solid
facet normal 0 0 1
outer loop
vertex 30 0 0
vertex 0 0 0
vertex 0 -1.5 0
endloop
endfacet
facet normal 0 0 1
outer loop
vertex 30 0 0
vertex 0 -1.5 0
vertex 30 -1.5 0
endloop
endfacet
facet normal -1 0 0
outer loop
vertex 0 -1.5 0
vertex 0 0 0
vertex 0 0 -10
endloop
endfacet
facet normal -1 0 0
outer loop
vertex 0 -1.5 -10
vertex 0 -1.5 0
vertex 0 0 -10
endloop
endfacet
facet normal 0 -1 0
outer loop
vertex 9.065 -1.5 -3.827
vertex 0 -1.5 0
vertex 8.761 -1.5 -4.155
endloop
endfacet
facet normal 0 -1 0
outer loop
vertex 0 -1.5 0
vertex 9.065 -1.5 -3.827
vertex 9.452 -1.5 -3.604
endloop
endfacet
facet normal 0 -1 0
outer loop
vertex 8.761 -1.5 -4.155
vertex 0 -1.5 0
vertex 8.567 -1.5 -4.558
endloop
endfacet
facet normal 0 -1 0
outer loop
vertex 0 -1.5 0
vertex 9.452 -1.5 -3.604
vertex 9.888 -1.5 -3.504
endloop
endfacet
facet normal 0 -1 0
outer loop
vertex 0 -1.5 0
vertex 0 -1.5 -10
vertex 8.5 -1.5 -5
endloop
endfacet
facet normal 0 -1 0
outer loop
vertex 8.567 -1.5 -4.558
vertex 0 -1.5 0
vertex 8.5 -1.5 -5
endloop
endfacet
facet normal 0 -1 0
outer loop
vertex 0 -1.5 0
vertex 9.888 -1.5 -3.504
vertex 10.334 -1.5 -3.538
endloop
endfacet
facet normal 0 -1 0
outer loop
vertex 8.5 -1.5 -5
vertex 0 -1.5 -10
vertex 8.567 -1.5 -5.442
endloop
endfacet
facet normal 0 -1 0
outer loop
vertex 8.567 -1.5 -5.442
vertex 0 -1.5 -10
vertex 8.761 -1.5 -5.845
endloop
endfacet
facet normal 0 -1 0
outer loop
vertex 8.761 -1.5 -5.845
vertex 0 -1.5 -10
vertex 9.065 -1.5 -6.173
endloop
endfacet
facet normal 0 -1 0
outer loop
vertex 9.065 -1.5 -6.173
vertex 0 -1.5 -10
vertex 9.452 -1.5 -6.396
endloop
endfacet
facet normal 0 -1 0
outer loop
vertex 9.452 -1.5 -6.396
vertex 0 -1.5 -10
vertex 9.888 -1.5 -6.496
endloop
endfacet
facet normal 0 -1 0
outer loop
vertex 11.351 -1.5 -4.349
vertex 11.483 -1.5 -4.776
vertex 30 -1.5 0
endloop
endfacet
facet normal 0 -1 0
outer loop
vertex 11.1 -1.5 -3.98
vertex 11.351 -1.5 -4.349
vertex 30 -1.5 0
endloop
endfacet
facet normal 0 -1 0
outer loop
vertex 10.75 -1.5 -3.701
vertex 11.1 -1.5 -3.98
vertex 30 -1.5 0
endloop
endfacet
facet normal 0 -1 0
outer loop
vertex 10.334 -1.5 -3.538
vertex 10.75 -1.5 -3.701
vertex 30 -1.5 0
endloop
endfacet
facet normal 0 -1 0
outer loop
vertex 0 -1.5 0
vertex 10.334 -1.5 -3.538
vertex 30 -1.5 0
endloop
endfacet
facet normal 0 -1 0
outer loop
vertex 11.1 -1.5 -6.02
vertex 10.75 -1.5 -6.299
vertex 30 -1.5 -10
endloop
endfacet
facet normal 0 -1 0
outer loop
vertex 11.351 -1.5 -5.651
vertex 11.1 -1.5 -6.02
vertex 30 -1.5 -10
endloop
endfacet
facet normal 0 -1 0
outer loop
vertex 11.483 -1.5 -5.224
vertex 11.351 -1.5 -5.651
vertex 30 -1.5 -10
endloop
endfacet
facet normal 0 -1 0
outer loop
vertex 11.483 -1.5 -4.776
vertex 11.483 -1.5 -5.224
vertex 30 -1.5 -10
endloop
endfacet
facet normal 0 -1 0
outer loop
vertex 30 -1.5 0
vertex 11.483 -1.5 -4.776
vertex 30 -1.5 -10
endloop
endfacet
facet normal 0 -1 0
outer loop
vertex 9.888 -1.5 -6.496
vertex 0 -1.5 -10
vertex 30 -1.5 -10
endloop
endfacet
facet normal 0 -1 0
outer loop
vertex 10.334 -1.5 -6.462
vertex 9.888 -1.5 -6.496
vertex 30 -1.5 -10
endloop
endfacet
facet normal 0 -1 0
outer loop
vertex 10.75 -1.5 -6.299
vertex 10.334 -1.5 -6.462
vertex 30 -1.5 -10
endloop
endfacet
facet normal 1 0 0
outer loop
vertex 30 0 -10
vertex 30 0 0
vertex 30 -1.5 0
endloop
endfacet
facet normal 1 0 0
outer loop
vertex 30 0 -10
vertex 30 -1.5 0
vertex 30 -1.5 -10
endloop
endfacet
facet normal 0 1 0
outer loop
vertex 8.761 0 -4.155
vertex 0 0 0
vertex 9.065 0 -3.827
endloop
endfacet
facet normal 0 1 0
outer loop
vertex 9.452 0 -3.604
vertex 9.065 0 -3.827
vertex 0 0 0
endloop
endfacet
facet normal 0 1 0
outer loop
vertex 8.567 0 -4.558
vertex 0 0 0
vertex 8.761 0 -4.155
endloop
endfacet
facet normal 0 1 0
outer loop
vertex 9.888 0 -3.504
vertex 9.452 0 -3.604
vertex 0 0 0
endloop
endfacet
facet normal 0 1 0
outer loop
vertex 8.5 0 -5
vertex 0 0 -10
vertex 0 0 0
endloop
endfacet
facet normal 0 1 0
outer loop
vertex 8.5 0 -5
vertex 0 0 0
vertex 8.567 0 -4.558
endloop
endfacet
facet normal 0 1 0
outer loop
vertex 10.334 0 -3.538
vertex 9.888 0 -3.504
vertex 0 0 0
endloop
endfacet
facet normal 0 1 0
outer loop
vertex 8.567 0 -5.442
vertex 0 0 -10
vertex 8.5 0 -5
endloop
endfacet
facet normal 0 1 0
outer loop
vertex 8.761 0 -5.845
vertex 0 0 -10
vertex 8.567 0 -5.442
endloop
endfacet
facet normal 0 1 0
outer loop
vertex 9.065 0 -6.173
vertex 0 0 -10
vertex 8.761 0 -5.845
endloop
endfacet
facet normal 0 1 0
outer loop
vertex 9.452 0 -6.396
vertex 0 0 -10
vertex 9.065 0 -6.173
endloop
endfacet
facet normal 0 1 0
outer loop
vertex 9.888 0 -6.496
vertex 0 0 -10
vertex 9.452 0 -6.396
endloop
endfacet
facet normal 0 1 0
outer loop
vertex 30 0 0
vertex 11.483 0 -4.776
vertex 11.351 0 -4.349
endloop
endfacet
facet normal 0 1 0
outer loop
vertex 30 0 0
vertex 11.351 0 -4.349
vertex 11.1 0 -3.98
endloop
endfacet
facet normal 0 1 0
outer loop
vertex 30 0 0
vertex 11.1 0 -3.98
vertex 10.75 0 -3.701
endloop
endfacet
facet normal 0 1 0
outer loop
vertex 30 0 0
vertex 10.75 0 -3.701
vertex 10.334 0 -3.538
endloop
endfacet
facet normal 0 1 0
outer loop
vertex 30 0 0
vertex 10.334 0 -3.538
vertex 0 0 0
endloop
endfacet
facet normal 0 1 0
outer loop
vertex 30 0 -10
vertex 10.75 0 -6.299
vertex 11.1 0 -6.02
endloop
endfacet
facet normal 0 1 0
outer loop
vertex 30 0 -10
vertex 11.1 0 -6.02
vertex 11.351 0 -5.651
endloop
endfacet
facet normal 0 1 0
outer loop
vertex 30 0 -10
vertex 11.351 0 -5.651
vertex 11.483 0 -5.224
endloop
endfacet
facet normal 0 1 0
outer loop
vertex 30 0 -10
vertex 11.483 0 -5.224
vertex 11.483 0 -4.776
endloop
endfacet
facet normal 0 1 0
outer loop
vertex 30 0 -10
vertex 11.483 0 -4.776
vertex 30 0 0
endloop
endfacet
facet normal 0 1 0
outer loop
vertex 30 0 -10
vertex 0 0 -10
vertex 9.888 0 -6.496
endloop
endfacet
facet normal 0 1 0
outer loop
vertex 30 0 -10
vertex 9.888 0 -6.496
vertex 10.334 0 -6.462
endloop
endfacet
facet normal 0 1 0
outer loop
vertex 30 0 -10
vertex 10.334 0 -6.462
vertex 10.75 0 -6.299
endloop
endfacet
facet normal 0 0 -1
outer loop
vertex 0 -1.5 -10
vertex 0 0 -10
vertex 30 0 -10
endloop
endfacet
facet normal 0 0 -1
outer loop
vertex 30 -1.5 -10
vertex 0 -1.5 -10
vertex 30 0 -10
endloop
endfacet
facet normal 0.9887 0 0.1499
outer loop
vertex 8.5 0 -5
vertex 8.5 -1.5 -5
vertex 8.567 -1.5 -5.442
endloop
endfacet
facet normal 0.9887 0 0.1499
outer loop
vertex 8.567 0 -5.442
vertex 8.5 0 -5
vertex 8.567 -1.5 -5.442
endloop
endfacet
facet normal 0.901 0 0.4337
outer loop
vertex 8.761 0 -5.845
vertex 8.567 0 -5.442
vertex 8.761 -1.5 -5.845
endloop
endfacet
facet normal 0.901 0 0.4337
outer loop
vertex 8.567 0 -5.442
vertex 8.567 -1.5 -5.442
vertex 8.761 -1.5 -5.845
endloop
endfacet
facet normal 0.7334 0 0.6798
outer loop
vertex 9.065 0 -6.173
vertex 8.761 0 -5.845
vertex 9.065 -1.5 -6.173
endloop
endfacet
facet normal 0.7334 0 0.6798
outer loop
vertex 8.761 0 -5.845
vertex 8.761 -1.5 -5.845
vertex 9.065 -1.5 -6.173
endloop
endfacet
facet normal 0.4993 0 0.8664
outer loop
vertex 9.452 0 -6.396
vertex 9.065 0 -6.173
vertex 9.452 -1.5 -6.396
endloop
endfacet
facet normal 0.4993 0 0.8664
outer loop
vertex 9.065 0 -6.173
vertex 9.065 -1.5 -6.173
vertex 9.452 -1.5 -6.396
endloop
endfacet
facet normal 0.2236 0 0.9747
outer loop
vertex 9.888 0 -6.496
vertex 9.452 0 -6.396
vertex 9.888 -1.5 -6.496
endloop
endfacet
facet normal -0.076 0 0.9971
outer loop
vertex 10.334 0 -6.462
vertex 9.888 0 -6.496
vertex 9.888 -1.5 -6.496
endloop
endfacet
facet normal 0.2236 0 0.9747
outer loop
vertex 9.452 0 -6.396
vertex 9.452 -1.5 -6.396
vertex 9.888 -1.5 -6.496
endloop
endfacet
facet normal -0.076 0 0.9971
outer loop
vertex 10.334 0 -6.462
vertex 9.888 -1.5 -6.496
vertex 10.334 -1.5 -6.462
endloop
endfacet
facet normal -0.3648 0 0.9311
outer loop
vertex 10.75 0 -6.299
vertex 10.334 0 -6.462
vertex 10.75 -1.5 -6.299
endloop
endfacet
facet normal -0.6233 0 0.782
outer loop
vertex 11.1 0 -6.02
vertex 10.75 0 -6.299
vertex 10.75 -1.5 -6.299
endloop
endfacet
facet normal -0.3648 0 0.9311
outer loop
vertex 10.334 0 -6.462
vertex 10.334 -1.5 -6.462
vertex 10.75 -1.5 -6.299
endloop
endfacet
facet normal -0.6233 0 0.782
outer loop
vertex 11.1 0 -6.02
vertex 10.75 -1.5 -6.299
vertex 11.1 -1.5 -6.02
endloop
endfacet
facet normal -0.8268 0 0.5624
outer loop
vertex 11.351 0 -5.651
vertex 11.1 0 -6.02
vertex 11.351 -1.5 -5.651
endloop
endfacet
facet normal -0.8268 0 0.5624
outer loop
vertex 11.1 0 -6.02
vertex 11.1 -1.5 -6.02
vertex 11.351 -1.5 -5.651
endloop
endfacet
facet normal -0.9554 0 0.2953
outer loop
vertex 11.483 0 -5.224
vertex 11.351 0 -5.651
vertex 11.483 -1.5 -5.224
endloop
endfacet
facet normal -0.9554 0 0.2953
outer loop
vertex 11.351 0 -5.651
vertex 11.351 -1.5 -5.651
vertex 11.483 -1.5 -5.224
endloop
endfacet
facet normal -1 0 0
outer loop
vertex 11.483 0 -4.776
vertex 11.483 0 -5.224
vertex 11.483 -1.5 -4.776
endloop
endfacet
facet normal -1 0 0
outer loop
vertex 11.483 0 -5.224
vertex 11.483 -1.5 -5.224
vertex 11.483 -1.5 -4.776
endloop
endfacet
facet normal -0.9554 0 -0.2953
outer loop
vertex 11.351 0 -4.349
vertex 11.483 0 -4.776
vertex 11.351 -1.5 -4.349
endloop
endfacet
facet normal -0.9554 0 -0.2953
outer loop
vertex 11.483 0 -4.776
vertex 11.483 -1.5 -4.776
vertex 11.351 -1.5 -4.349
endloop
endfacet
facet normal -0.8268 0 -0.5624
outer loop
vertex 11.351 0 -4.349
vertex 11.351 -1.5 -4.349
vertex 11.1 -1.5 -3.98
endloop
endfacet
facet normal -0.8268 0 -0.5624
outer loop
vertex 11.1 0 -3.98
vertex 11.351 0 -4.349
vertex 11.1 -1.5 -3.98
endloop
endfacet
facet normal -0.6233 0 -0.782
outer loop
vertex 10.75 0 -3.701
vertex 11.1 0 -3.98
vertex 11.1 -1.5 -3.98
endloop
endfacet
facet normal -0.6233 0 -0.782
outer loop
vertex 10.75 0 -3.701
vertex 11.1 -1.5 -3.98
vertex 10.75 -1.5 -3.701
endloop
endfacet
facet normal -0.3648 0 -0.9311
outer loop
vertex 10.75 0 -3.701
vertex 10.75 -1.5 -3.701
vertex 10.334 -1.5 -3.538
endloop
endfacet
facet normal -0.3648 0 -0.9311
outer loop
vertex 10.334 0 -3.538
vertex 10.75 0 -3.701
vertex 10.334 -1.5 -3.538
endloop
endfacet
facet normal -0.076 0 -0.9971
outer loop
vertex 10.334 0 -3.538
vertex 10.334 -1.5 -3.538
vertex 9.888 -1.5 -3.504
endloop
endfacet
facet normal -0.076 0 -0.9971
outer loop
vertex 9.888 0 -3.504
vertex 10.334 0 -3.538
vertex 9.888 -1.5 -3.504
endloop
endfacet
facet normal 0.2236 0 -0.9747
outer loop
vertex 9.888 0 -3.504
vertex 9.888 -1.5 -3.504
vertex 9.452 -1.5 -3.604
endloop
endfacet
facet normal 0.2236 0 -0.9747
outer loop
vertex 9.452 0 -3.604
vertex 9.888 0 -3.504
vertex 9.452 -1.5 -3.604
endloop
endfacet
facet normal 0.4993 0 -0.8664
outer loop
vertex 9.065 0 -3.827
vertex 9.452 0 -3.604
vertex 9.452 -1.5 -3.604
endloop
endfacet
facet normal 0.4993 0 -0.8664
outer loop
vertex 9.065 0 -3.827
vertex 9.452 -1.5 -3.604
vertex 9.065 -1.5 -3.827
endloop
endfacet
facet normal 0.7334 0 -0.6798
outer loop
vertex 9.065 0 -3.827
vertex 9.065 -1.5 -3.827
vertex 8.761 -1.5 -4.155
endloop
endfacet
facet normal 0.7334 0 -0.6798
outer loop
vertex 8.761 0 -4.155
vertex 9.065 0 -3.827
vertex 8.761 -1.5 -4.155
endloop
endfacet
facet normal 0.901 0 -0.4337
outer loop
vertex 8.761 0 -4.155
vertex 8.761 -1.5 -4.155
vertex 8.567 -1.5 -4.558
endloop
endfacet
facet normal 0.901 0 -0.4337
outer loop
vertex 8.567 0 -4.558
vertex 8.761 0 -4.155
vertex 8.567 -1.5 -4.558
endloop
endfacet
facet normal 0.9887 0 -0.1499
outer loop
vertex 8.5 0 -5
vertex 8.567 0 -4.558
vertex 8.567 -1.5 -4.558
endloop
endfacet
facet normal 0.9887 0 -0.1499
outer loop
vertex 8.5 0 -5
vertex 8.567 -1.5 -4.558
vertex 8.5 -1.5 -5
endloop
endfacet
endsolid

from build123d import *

# Parameters (mm, degrees)
SKETCH1_W                   = 30
SKETCH1_H                   = 10
BASE_FLANGE1_DEPTH          = 1.5
F_3_0MM_PRESS_DOWEL_HOLE1_D = 3


# Sheet-metal steps are written as plain solids
with BuildPart() as part:
    # Sketch1 → Base-Flange1 (new body)
    with BuildSketch(Plane(origin=(0, 0, 0), x_dir=(1, 0, 0), z_dir=(0, 1, 0))):
        with Locations((15, 5)):
            Rectangle(SKETCH1_W, SKETCH1_H)
    extrude(amount=-BASE_FLANGE1_DEPTH)

    # Ø3.0mm Press Dowel Hole1 (through all)
    with Locations(Plane(origin=(0, 0, 0), x_dir=(1, 0, 0), z_dir=(0, 1, 0))):
        with Locations((10, 5)):
            Hole(F_3_0MM_PRESS_DOWEL_HOLE1_D / 2)


solid = part.part
